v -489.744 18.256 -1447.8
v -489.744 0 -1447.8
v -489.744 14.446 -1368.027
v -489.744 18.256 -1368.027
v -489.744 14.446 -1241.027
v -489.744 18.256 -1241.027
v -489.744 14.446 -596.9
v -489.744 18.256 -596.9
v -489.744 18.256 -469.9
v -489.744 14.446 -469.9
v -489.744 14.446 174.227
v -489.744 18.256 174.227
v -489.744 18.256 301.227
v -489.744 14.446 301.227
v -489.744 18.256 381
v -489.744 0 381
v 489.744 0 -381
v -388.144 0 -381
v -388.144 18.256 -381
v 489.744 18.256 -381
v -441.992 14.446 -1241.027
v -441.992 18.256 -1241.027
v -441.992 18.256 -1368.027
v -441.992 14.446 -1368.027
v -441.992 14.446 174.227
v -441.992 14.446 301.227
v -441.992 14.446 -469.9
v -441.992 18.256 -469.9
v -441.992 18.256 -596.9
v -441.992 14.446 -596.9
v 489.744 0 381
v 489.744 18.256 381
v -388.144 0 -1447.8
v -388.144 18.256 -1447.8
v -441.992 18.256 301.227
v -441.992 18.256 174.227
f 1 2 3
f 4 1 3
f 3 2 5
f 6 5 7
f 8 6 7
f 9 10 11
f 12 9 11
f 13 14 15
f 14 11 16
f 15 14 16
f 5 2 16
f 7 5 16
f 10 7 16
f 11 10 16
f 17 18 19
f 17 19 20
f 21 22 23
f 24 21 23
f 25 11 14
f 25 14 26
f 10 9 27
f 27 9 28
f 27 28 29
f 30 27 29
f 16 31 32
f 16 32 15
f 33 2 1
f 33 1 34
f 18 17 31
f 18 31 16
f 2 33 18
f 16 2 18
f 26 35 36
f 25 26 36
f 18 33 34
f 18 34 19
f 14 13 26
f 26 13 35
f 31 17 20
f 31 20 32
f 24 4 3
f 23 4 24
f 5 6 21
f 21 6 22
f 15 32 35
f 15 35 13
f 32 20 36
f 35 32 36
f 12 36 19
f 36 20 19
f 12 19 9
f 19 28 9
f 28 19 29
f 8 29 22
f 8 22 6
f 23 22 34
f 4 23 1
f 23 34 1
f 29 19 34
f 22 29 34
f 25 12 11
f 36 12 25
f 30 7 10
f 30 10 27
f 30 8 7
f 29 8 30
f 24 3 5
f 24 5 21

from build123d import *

# Parameters (mm, degrees)
BOSS_EXTRUDE1_DEPTH = 18.25625
SKETCH2_W           = 47.752
SKETCH2_H           = 127
CUT_EXTRUDE1_DEPTH  = 3.81


with BuildPart() as part:
    # Sketch1 → Boss-Extrude1 (new body)
    with BuildSketch(Plane(origin=(0, 0, 0), x_dir=(1, 0, 0), z_dir=(0, 1, 0))):
        Polygon((-489.74375, 381), (-489.74375, 1447.8), (-388.14375, 1447.8), (-388.14375, 381), (489.74375, 381), (489.74375, -381), (-489.74375, -381), align=None)
    extrude(amount=BOSS_EXTRUDE1_DEPTH)

    # Sketch2 → Cut-Extrude1 (cut)
    with BuildSketch(Plane(origin=(0, 18.25625, 0), x_dir=(1, 0, 0), z_dir=(0, 1, 0))):
        with Locations((-465.86775, 1304.527191457)):
            Rectangle(SKETCH2_W, SKETCH2_H)
        with Locations((-465.86775, 533.4)):
            Rectangle(SKETCH2_W, SKETCH2_H)
        with Locations((-465.86775, -237.727191457)):
            Rectangle(SKETCH2_W, SKETCH2_H)
    extrude(amount=-CUT_EXTRUDE1_DEPTH, mode=Mode.SUBTRACT)


solid = part.part
